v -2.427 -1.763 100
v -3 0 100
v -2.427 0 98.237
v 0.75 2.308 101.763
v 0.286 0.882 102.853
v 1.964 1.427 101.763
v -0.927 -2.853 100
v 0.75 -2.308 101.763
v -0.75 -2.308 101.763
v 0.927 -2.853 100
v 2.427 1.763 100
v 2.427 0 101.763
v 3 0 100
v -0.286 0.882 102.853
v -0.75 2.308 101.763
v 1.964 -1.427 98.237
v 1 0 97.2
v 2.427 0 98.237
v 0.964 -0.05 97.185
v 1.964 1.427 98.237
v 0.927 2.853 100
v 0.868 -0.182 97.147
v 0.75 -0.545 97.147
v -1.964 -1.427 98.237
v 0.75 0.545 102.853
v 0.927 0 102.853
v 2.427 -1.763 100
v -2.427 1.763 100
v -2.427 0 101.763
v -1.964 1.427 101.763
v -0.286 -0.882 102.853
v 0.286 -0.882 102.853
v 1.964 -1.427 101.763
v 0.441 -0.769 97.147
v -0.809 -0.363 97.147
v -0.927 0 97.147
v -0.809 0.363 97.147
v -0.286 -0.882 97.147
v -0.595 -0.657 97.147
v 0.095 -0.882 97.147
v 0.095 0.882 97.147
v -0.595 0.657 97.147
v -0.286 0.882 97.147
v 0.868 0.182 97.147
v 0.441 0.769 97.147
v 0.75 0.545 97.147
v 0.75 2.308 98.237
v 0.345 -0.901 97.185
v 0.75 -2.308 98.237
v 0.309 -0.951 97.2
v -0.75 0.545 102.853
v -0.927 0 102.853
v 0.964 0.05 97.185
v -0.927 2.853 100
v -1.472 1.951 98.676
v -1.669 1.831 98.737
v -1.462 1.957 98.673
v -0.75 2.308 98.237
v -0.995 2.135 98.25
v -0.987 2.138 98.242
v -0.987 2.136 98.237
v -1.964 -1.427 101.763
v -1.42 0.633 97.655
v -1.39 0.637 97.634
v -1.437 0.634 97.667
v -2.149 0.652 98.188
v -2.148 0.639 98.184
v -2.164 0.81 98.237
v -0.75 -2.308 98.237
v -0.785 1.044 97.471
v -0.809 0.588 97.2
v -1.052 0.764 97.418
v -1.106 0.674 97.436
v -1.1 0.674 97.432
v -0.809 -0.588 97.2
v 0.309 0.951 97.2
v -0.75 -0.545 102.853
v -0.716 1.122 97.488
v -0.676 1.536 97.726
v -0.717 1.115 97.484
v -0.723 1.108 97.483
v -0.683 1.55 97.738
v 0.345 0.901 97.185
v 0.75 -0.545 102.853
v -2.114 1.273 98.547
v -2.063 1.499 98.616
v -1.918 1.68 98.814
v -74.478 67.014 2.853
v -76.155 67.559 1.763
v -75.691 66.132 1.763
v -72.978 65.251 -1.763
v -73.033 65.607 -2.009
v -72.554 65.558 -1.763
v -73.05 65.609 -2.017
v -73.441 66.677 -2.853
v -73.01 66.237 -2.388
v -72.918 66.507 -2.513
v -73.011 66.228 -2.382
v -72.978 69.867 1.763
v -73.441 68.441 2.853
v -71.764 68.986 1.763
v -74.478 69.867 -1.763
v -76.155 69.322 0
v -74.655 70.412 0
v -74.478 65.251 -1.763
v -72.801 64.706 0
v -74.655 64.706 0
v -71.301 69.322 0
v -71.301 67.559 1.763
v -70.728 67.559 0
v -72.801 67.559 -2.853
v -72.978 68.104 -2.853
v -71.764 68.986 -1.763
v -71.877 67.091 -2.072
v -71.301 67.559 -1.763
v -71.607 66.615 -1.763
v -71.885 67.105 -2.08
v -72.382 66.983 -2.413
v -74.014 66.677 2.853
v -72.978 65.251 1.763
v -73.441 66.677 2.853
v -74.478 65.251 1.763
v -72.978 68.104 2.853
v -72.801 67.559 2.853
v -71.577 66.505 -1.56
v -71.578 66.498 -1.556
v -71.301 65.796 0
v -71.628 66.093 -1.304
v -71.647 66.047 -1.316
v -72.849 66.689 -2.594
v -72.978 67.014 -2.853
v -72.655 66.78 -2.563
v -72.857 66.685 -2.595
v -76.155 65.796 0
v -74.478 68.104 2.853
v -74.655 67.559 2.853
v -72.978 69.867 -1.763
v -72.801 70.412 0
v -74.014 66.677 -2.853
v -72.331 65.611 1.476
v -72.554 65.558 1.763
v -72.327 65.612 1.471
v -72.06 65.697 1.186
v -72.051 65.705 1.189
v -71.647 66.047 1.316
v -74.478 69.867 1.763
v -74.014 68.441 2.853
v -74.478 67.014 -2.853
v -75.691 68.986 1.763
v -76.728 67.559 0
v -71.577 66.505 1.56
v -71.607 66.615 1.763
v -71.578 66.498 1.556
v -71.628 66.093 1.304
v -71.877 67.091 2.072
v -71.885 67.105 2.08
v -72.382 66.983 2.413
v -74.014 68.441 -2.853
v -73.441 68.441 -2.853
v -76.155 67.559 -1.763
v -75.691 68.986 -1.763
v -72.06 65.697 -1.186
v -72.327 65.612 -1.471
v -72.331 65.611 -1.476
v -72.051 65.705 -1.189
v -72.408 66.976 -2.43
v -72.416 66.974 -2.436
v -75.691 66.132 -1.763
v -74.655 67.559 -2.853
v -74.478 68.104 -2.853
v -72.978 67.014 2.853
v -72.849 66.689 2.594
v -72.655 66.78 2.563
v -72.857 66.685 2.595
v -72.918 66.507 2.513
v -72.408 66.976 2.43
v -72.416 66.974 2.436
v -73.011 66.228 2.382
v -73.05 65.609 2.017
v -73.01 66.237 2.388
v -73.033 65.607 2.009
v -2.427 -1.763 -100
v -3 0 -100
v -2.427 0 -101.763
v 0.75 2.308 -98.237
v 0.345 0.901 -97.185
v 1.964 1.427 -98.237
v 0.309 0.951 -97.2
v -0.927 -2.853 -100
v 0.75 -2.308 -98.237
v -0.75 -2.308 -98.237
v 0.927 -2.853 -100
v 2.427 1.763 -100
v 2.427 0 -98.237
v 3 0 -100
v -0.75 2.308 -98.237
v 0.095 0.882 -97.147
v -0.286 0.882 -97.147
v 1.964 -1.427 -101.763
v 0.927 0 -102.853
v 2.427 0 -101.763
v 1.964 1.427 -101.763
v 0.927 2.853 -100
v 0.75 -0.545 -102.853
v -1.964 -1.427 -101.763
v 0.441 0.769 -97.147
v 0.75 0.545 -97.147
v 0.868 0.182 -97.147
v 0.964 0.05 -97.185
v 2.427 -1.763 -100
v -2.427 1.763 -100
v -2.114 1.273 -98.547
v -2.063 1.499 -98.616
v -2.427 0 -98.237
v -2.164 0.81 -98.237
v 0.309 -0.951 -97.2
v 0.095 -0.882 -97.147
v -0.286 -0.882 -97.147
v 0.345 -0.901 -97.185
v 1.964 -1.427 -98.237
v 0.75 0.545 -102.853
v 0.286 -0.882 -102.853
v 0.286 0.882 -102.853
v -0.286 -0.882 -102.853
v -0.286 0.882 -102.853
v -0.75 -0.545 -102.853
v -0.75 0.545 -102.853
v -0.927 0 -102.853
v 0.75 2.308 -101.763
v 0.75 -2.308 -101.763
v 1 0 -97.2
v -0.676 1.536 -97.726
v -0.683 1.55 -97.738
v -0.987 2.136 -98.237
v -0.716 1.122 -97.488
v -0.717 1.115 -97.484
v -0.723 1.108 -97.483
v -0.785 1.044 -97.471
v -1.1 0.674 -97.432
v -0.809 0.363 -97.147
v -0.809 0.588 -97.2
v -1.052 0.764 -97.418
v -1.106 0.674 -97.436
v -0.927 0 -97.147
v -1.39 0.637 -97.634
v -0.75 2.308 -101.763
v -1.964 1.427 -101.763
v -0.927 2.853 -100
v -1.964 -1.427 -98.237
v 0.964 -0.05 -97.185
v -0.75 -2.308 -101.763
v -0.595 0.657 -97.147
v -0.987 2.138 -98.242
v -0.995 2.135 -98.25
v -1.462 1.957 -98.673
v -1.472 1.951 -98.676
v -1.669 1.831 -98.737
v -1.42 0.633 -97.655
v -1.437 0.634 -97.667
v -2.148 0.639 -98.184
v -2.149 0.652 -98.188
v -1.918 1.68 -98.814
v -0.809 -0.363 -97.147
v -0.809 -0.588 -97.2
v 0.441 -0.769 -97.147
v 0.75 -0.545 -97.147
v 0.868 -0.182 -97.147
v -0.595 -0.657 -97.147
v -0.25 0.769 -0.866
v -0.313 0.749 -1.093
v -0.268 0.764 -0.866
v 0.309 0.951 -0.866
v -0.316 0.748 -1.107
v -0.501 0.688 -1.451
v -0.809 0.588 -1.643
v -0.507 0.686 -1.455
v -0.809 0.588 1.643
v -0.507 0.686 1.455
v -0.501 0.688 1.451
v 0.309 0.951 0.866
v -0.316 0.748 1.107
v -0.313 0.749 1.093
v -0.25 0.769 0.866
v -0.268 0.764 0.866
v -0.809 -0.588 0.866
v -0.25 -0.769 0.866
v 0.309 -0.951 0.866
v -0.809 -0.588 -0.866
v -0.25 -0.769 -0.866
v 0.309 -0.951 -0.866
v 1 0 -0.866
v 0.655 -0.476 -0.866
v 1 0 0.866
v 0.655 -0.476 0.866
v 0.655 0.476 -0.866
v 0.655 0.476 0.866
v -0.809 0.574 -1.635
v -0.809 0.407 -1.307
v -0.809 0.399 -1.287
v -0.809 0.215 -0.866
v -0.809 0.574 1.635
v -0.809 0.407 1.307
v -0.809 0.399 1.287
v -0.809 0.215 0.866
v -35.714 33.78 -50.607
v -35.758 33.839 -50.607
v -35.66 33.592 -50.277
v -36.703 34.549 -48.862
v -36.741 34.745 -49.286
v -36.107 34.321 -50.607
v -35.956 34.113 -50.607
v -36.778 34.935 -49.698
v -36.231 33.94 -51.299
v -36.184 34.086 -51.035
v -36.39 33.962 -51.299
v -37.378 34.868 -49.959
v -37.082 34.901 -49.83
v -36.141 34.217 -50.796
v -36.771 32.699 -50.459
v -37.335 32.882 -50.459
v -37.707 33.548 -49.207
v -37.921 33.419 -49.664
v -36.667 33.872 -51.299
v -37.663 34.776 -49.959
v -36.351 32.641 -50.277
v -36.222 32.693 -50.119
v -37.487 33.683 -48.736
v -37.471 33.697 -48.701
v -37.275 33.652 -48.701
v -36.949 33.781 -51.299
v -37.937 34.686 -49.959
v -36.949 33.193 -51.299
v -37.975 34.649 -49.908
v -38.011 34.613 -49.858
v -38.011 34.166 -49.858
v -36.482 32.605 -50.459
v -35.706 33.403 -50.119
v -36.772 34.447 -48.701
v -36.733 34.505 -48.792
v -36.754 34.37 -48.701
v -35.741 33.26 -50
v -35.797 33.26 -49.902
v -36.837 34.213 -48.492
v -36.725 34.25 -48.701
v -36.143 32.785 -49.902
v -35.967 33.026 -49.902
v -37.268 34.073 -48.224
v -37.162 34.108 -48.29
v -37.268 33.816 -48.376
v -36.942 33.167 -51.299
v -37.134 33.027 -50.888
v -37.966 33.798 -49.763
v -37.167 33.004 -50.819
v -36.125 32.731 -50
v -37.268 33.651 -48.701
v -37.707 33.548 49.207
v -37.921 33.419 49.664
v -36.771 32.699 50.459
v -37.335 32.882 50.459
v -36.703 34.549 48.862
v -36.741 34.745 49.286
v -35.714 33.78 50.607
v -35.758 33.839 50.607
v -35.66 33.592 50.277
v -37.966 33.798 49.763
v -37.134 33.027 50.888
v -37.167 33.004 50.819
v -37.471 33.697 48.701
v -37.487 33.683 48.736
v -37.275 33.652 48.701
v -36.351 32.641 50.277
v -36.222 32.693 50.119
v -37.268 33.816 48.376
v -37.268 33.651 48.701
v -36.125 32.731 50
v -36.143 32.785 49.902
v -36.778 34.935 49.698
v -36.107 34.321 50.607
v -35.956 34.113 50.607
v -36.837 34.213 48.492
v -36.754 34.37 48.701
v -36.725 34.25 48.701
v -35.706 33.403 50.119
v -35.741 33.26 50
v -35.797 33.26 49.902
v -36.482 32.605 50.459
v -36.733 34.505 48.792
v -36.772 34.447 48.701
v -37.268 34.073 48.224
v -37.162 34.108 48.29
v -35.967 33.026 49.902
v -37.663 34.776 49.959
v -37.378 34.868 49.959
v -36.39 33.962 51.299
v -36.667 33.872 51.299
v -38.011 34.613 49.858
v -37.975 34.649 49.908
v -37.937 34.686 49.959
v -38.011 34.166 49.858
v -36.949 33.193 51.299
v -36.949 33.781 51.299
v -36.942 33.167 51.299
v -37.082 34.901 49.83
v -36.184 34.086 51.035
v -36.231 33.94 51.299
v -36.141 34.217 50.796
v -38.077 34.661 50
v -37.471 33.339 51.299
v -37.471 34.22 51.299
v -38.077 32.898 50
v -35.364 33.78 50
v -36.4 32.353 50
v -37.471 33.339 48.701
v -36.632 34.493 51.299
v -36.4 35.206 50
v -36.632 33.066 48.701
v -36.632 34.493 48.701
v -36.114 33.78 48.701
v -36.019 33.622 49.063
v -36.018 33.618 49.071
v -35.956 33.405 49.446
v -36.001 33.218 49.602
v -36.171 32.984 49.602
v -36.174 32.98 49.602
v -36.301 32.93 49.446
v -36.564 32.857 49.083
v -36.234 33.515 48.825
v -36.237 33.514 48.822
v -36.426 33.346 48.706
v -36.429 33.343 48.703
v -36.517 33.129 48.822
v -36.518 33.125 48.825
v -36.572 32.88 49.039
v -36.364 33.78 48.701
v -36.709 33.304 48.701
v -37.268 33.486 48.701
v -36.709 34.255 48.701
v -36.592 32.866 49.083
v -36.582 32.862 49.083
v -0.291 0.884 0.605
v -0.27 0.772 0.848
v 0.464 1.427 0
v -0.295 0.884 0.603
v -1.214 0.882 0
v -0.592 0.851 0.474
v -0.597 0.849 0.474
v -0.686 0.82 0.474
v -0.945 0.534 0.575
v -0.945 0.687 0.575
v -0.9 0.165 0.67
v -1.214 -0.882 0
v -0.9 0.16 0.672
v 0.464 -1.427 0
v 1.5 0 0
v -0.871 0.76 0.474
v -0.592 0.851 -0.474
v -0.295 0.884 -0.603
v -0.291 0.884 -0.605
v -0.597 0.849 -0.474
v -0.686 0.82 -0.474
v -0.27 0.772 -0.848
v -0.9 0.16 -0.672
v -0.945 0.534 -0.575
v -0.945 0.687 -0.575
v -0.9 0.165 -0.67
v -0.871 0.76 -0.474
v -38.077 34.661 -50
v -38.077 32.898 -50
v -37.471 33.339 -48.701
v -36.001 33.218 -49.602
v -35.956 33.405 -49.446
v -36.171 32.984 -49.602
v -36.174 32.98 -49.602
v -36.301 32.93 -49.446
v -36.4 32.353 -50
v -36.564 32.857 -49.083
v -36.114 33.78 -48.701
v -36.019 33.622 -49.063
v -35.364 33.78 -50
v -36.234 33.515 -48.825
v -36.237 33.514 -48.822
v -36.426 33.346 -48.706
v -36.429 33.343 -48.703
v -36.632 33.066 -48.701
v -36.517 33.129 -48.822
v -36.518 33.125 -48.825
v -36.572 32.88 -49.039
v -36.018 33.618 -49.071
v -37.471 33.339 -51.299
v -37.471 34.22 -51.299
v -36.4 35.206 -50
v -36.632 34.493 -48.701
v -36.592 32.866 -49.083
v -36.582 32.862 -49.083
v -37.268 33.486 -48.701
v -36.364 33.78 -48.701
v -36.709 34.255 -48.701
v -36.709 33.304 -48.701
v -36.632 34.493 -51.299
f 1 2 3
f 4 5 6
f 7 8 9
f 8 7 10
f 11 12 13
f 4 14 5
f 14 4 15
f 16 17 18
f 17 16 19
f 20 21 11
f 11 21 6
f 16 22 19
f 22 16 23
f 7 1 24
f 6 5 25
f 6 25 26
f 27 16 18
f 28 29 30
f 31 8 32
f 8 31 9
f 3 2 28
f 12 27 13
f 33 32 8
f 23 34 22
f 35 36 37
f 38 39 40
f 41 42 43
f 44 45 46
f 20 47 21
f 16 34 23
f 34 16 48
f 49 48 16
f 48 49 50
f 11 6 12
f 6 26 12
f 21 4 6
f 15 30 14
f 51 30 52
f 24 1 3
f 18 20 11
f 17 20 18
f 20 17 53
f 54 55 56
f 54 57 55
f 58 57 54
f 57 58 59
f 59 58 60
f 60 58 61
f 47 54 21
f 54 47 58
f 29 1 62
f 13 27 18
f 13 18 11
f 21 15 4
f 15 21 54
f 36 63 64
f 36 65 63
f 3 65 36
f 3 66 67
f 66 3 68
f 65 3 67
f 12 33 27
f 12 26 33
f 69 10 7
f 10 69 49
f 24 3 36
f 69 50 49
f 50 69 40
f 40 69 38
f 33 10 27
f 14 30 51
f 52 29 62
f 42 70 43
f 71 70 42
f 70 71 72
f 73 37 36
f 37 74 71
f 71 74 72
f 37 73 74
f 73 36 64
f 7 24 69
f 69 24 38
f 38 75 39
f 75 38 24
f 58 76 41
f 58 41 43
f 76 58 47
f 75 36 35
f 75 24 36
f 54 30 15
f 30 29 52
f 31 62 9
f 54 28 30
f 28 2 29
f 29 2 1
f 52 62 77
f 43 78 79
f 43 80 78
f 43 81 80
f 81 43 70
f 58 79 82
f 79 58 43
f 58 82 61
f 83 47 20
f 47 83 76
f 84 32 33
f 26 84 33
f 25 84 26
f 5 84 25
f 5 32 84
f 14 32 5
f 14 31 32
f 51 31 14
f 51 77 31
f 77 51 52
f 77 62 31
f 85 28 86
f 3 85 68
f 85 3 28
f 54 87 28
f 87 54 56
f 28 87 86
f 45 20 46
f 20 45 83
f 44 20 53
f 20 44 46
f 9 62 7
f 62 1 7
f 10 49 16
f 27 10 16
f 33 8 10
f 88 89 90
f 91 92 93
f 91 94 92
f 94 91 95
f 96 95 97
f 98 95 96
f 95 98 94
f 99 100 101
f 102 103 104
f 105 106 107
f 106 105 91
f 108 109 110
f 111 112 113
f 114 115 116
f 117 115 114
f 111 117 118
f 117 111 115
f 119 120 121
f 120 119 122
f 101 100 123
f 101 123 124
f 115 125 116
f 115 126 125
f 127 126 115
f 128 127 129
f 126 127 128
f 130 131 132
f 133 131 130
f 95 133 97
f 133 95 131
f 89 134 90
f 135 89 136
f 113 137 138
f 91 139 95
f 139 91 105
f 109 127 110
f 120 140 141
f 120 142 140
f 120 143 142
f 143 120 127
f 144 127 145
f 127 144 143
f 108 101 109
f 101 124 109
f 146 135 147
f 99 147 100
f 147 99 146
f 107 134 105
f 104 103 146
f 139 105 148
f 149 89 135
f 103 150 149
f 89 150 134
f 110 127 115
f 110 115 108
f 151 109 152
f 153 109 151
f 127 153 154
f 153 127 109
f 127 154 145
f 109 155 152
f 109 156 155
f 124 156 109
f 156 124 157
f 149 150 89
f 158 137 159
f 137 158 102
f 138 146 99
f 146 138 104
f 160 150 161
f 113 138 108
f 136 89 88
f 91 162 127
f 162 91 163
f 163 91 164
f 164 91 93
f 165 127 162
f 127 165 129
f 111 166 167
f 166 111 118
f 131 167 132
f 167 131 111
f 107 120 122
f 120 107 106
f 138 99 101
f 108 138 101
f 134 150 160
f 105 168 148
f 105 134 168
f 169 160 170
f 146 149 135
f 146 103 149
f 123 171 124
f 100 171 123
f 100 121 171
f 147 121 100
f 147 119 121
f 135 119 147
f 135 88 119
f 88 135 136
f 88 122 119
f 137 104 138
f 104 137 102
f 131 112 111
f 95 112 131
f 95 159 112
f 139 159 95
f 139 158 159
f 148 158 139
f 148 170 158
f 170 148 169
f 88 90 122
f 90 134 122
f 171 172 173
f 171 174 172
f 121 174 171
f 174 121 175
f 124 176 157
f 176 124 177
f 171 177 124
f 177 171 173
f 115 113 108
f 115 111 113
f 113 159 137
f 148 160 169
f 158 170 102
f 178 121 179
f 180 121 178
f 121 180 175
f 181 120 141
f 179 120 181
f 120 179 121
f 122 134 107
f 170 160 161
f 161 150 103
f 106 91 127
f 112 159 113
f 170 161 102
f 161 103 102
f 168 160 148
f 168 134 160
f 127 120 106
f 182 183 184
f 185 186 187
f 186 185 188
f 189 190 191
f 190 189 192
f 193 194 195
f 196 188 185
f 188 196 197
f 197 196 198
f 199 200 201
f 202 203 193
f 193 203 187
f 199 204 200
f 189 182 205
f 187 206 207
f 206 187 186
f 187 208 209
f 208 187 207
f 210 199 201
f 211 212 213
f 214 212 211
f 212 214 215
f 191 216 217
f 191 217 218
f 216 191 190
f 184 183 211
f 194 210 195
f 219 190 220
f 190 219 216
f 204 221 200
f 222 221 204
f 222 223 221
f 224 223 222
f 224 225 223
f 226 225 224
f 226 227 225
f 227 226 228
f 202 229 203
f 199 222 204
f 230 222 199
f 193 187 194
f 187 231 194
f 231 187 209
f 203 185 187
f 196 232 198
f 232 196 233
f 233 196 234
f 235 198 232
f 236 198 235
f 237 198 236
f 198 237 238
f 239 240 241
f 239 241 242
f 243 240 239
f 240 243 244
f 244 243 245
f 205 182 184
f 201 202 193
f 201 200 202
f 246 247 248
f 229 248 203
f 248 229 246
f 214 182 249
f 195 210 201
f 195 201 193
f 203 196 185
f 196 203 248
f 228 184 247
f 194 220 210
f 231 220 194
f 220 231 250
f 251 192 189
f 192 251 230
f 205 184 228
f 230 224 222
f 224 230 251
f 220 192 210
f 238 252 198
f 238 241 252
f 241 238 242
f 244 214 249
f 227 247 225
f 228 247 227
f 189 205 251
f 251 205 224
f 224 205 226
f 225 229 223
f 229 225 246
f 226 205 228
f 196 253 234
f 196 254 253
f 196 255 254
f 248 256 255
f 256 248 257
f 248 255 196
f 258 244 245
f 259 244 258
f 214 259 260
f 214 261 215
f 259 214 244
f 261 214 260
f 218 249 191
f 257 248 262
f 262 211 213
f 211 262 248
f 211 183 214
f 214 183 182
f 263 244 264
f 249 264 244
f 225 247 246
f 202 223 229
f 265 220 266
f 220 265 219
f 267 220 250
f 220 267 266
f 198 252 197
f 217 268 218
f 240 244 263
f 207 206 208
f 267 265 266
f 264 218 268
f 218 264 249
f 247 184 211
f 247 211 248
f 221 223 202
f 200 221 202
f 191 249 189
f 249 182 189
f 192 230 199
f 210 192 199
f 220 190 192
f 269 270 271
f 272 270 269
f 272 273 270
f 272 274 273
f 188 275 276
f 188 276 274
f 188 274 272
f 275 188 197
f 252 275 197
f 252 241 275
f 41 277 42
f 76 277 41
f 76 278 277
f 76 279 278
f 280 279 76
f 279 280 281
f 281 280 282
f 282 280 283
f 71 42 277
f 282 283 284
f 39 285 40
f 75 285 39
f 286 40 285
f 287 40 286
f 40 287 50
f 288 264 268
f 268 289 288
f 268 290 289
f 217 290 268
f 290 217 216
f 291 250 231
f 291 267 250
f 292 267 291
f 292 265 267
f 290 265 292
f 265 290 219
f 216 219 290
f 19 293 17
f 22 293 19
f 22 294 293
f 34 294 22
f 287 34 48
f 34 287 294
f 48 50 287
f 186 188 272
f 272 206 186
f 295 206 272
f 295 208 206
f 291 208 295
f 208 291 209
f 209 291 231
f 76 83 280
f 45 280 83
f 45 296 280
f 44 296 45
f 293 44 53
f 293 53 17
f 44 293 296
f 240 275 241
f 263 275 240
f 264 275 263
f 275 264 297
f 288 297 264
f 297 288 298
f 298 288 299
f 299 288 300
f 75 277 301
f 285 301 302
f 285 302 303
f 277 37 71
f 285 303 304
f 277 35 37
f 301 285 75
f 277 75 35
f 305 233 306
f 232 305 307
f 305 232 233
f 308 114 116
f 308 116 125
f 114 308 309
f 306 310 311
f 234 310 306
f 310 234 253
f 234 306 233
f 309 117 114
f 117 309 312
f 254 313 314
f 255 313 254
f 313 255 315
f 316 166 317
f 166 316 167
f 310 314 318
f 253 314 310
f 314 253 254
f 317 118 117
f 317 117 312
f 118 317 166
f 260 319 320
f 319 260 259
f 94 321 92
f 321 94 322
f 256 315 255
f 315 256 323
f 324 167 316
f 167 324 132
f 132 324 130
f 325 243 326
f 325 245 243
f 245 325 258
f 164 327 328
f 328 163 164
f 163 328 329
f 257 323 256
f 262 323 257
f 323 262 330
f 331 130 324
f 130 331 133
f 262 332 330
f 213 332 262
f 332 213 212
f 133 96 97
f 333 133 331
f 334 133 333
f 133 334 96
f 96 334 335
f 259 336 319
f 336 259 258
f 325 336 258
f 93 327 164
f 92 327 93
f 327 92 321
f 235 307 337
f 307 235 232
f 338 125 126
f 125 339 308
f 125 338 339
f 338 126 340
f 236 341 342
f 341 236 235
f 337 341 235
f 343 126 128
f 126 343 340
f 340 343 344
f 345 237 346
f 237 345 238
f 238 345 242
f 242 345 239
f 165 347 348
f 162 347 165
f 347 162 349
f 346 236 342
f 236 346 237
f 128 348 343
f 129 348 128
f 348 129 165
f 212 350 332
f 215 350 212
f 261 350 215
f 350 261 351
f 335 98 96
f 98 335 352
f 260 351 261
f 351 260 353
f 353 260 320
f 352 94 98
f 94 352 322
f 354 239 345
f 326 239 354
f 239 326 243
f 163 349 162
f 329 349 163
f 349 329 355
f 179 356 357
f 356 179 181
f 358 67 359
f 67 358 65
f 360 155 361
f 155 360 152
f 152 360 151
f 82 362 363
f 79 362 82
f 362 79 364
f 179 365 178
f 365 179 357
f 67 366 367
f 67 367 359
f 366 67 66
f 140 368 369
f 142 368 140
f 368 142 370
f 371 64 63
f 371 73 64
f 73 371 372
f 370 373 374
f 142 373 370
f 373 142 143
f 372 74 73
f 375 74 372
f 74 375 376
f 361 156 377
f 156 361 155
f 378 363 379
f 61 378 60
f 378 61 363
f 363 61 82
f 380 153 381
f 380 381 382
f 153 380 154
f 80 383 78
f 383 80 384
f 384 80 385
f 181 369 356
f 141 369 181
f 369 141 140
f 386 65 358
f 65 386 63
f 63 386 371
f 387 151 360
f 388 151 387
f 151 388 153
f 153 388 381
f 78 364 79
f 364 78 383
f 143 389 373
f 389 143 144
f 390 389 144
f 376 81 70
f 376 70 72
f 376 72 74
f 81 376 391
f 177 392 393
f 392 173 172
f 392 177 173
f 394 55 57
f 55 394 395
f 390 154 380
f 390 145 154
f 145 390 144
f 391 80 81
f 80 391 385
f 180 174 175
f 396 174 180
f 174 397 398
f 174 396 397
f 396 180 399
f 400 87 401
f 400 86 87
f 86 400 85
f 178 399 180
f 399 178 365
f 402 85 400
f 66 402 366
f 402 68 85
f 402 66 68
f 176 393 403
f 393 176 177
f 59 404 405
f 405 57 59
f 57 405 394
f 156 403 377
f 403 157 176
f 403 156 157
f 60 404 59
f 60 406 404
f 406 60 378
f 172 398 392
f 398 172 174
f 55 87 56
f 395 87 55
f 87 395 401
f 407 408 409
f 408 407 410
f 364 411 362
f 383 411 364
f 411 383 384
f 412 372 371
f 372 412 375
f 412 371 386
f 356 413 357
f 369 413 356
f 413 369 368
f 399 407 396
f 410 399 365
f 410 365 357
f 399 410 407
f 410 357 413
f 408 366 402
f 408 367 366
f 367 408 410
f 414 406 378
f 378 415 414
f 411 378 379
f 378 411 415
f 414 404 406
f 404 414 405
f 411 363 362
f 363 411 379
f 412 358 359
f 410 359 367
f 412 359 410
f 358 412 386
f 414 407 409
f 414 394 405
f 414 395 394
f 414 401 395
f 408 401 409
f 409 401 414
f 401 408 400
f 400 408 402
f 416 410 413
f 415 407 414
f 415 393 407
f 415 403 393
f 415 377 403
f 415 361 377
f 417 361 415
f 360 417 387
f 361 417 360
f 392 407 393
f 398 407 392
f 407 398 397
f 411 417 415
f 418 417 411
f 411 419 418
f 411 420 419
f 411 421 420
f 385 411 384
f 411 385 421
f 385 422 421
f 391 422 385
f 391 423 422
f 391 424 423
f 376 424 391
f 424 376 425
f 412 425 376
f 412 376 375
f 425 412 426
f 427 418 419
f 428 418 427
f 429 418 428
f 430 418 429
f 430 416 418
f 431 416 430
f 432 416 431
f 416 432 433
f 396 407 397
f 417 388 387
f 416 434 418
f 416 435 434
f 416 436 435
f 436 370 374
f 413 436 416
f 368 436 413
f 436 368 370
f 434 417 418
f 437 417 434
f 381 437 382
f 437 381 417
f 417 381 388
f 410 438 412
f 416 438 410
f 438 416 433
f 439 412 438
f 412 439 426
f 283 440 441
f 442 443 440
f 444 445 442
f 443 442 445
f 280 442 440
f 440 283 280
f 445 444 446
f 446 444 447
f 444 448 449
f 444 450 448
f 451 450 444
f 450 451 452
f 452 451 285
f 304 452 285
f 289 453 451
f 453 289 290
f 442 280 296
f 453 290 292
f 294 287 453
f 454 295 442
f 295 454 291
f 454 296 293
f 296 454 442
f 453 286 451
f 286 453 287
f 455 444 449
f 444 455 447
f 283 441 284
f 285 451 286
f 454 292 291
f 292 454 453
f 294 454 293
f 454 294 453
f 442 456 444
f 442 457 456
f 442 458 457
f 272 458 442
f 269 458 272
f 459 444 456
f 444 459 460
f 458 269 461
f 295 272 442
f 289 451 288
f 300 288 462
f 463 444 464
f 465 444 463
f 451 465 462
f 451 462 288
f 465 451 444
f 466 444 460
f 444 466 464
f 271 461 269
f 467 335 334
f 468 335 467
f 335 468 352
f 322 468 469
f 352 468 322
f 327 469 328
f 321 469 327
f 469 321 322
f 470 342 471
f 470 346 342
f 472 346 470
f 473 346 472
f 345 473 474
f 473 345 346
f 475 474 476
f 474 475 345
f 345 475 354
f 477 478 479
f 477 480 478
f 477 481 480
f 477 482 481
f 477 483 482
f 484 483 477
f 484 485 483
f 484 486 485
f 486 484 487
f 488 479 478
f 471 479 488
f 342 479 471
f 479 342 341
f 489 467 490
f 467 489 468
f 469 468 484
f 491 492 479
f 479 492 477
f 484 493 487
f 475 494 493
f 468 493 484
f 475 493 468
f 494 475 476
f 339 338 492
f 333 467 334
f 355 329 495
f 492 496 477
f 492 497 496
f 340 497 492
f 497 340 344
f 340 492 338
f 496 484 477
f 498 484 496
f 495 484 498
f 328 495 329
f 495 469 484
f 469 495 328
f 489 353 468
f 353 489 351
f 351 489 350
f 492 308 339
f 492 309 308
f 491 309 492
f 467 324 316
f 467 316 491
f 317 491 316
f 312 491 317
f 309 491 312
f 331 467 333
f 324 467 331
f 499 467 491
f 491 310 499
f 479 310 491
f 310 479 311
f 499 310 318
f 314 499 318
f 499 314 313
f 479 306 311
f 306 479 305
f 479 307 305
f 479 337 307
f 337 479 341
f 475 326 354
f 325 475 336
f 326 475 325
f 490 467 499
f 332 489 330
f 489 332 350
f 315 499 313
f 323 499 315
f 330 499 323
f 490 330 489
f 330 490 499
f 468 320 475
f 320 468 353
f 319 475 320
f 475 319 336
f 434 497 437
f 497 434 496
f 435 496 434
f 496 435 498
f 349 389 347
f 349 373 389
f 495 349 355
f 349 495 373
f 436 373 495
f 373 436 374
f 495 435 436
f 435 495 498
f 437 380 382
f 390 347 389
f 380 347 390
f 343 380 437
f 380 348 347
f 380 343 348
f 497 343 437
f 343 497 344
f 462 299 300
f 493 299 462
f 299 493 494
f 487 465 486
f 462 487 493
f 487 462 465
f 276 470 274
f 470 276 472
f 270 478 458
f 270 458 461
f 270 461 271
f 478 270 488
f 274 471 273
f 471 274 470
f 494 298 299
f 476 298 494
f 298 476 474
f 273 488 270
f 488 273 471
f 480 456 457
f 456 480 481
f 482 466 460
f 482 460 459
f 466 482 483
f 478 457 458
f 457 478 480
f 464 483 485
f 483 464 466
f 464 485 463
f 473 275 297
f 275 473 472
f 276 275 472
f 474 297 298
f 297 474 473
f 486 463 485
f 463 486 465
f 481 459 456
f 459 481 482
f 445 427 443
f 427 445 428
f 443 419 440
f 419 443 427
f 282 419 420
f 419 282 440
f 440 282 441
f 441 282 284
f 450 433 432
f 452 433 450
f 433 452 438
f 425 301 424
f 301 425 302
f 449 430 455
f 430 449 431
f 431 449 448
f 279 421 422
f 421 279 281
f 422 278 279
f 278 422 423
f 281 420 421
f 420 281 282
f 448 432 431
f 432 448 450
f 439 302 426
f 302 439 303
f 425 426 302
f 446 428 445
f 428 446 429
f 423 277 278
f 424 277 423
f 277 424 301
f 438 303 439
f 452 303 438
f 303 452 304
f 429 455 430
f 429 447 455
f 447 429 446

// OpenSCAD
n = 3;//specifies the number of nodes
d = 100;//distance of nodes from the center
r = 3;//node size
t = 1;//connection thickness

//this part below generates coordinates so that the nodes are laid out evenly in a sphere thanks to Claude Haiku 4.5
generated_points = [for (i = [0:n-1]) 
    let (
        phi = i * 180 / (n - 1),           // vertical angle (0 to 180 degrees)
        theta = i * 137.5                   // horizontal angle (golden angle)
    )
    [
        d * sin(phi) * cos(theta),
        d * sin(phi) * sin(theta),
        d * cos(phi)
    ]
];

//manually defined points
manual_points = [
//    [0, 0, 0]
];

//combine both arrays
points = concat(generated_points, manual_points);

//actually creates the nodes
color("#F00"){
for (p = points) {
    translate(p){sphere(r);}
}
}

//draws connections between the nodes
color("#08F6"){
for(i=[0:len(points)-1]){
    for(j=[0:len(points)-1]){
        if(i>j){//this prevents drawing the same connection twice
        hull(){
            translate(points[i]){sphere(t);}
            translate(points[j]){sphere(t);}
        }
        }
    }
}
}

//calculate midpoints of all connections
midpoints = [for(i=[0:len(points)-1]) for(j=[0:len(points)-1]) if(i>j)
    [(points[i][0] + points[j][0])/2,
     (points[i][1] + points[j][1])/2,
     (points[i][2] + points[j][2])/2]
];

echo("midpoints:",len(midpoints));

color("#0F0"){
for (p = midpoints) {
    translate(p){sphere(r/2);}
}
}


//draws connections between the midpoints
color("#0F03"){
for(i=[0:len(midpoints)-1]){
    for(j=[0:len(midpoints)-1]){
        if(i>j){//this prevents drawing the same connection twice
        hull(){
            translate(midpoints[i]){sphere(t/2);}
            translate(midpoints[j]){sphere(t/2);}
        }
        }
    }
}
}



//calculate double-midpoints of connections between the midpoints
d_midpoints = [for(i=[0:len(midpoints)-1]) for(j=[0:len(midpoints)-1]) if(i>j)
    [(midpoints[i][0] + midpoints[j][0])/2,
     (midpoints[i][1] + midpoints[j][1])/2,
     (midpoints[i][2] + midpoints[j][2])/2]
];

echo("d_midpoints:",len(d_midpoints));


//these variables must be defined explicitly for them to work in command line
$vpt = [0,0,0];
$vpr = [85.8,0,345.8];
$vpd = 650;

//add text to the render
translate($vpt){
    rotate($vpr){
        translate([-0.19*$vpd,0.18*$vpd,0]){
            color("#0FF"){text("composite mind illustration",$vpd*0.01,halign="left");}
        }
        translate([0.19*$vpd,0.18*$vpd,0]){
            color("#F00"){text(str("brain nodes: ",n),$vpd*0.01,halign="right");}
        }
        translate([0.19*$vpd,0.165*$vpd,0]){
            color("#08F"){text(str("bridges: ",len(midpoints)),$vpd*0.01,halign="right");}
        }
        translate([0.19*$vpd,0.15*$vpd,0]){
            color("#0F0"){text(str("meta-bridges: ",len(d_midpoints)),$vpd*0.01,halign="right");}
        }
    }
}

//openscad composite_mind.scad -o composite_mind.png --colorscheme=Starnight --imgsize=1000,1000
//for 3 nodes, --camera=-18.3,22.84,0,90,0,308.7,680
//for 4 nodes, --camera=-18.3,22.84,0,85.8,0,345.8,680
//anything above 26 requires --csglimit=10000000
